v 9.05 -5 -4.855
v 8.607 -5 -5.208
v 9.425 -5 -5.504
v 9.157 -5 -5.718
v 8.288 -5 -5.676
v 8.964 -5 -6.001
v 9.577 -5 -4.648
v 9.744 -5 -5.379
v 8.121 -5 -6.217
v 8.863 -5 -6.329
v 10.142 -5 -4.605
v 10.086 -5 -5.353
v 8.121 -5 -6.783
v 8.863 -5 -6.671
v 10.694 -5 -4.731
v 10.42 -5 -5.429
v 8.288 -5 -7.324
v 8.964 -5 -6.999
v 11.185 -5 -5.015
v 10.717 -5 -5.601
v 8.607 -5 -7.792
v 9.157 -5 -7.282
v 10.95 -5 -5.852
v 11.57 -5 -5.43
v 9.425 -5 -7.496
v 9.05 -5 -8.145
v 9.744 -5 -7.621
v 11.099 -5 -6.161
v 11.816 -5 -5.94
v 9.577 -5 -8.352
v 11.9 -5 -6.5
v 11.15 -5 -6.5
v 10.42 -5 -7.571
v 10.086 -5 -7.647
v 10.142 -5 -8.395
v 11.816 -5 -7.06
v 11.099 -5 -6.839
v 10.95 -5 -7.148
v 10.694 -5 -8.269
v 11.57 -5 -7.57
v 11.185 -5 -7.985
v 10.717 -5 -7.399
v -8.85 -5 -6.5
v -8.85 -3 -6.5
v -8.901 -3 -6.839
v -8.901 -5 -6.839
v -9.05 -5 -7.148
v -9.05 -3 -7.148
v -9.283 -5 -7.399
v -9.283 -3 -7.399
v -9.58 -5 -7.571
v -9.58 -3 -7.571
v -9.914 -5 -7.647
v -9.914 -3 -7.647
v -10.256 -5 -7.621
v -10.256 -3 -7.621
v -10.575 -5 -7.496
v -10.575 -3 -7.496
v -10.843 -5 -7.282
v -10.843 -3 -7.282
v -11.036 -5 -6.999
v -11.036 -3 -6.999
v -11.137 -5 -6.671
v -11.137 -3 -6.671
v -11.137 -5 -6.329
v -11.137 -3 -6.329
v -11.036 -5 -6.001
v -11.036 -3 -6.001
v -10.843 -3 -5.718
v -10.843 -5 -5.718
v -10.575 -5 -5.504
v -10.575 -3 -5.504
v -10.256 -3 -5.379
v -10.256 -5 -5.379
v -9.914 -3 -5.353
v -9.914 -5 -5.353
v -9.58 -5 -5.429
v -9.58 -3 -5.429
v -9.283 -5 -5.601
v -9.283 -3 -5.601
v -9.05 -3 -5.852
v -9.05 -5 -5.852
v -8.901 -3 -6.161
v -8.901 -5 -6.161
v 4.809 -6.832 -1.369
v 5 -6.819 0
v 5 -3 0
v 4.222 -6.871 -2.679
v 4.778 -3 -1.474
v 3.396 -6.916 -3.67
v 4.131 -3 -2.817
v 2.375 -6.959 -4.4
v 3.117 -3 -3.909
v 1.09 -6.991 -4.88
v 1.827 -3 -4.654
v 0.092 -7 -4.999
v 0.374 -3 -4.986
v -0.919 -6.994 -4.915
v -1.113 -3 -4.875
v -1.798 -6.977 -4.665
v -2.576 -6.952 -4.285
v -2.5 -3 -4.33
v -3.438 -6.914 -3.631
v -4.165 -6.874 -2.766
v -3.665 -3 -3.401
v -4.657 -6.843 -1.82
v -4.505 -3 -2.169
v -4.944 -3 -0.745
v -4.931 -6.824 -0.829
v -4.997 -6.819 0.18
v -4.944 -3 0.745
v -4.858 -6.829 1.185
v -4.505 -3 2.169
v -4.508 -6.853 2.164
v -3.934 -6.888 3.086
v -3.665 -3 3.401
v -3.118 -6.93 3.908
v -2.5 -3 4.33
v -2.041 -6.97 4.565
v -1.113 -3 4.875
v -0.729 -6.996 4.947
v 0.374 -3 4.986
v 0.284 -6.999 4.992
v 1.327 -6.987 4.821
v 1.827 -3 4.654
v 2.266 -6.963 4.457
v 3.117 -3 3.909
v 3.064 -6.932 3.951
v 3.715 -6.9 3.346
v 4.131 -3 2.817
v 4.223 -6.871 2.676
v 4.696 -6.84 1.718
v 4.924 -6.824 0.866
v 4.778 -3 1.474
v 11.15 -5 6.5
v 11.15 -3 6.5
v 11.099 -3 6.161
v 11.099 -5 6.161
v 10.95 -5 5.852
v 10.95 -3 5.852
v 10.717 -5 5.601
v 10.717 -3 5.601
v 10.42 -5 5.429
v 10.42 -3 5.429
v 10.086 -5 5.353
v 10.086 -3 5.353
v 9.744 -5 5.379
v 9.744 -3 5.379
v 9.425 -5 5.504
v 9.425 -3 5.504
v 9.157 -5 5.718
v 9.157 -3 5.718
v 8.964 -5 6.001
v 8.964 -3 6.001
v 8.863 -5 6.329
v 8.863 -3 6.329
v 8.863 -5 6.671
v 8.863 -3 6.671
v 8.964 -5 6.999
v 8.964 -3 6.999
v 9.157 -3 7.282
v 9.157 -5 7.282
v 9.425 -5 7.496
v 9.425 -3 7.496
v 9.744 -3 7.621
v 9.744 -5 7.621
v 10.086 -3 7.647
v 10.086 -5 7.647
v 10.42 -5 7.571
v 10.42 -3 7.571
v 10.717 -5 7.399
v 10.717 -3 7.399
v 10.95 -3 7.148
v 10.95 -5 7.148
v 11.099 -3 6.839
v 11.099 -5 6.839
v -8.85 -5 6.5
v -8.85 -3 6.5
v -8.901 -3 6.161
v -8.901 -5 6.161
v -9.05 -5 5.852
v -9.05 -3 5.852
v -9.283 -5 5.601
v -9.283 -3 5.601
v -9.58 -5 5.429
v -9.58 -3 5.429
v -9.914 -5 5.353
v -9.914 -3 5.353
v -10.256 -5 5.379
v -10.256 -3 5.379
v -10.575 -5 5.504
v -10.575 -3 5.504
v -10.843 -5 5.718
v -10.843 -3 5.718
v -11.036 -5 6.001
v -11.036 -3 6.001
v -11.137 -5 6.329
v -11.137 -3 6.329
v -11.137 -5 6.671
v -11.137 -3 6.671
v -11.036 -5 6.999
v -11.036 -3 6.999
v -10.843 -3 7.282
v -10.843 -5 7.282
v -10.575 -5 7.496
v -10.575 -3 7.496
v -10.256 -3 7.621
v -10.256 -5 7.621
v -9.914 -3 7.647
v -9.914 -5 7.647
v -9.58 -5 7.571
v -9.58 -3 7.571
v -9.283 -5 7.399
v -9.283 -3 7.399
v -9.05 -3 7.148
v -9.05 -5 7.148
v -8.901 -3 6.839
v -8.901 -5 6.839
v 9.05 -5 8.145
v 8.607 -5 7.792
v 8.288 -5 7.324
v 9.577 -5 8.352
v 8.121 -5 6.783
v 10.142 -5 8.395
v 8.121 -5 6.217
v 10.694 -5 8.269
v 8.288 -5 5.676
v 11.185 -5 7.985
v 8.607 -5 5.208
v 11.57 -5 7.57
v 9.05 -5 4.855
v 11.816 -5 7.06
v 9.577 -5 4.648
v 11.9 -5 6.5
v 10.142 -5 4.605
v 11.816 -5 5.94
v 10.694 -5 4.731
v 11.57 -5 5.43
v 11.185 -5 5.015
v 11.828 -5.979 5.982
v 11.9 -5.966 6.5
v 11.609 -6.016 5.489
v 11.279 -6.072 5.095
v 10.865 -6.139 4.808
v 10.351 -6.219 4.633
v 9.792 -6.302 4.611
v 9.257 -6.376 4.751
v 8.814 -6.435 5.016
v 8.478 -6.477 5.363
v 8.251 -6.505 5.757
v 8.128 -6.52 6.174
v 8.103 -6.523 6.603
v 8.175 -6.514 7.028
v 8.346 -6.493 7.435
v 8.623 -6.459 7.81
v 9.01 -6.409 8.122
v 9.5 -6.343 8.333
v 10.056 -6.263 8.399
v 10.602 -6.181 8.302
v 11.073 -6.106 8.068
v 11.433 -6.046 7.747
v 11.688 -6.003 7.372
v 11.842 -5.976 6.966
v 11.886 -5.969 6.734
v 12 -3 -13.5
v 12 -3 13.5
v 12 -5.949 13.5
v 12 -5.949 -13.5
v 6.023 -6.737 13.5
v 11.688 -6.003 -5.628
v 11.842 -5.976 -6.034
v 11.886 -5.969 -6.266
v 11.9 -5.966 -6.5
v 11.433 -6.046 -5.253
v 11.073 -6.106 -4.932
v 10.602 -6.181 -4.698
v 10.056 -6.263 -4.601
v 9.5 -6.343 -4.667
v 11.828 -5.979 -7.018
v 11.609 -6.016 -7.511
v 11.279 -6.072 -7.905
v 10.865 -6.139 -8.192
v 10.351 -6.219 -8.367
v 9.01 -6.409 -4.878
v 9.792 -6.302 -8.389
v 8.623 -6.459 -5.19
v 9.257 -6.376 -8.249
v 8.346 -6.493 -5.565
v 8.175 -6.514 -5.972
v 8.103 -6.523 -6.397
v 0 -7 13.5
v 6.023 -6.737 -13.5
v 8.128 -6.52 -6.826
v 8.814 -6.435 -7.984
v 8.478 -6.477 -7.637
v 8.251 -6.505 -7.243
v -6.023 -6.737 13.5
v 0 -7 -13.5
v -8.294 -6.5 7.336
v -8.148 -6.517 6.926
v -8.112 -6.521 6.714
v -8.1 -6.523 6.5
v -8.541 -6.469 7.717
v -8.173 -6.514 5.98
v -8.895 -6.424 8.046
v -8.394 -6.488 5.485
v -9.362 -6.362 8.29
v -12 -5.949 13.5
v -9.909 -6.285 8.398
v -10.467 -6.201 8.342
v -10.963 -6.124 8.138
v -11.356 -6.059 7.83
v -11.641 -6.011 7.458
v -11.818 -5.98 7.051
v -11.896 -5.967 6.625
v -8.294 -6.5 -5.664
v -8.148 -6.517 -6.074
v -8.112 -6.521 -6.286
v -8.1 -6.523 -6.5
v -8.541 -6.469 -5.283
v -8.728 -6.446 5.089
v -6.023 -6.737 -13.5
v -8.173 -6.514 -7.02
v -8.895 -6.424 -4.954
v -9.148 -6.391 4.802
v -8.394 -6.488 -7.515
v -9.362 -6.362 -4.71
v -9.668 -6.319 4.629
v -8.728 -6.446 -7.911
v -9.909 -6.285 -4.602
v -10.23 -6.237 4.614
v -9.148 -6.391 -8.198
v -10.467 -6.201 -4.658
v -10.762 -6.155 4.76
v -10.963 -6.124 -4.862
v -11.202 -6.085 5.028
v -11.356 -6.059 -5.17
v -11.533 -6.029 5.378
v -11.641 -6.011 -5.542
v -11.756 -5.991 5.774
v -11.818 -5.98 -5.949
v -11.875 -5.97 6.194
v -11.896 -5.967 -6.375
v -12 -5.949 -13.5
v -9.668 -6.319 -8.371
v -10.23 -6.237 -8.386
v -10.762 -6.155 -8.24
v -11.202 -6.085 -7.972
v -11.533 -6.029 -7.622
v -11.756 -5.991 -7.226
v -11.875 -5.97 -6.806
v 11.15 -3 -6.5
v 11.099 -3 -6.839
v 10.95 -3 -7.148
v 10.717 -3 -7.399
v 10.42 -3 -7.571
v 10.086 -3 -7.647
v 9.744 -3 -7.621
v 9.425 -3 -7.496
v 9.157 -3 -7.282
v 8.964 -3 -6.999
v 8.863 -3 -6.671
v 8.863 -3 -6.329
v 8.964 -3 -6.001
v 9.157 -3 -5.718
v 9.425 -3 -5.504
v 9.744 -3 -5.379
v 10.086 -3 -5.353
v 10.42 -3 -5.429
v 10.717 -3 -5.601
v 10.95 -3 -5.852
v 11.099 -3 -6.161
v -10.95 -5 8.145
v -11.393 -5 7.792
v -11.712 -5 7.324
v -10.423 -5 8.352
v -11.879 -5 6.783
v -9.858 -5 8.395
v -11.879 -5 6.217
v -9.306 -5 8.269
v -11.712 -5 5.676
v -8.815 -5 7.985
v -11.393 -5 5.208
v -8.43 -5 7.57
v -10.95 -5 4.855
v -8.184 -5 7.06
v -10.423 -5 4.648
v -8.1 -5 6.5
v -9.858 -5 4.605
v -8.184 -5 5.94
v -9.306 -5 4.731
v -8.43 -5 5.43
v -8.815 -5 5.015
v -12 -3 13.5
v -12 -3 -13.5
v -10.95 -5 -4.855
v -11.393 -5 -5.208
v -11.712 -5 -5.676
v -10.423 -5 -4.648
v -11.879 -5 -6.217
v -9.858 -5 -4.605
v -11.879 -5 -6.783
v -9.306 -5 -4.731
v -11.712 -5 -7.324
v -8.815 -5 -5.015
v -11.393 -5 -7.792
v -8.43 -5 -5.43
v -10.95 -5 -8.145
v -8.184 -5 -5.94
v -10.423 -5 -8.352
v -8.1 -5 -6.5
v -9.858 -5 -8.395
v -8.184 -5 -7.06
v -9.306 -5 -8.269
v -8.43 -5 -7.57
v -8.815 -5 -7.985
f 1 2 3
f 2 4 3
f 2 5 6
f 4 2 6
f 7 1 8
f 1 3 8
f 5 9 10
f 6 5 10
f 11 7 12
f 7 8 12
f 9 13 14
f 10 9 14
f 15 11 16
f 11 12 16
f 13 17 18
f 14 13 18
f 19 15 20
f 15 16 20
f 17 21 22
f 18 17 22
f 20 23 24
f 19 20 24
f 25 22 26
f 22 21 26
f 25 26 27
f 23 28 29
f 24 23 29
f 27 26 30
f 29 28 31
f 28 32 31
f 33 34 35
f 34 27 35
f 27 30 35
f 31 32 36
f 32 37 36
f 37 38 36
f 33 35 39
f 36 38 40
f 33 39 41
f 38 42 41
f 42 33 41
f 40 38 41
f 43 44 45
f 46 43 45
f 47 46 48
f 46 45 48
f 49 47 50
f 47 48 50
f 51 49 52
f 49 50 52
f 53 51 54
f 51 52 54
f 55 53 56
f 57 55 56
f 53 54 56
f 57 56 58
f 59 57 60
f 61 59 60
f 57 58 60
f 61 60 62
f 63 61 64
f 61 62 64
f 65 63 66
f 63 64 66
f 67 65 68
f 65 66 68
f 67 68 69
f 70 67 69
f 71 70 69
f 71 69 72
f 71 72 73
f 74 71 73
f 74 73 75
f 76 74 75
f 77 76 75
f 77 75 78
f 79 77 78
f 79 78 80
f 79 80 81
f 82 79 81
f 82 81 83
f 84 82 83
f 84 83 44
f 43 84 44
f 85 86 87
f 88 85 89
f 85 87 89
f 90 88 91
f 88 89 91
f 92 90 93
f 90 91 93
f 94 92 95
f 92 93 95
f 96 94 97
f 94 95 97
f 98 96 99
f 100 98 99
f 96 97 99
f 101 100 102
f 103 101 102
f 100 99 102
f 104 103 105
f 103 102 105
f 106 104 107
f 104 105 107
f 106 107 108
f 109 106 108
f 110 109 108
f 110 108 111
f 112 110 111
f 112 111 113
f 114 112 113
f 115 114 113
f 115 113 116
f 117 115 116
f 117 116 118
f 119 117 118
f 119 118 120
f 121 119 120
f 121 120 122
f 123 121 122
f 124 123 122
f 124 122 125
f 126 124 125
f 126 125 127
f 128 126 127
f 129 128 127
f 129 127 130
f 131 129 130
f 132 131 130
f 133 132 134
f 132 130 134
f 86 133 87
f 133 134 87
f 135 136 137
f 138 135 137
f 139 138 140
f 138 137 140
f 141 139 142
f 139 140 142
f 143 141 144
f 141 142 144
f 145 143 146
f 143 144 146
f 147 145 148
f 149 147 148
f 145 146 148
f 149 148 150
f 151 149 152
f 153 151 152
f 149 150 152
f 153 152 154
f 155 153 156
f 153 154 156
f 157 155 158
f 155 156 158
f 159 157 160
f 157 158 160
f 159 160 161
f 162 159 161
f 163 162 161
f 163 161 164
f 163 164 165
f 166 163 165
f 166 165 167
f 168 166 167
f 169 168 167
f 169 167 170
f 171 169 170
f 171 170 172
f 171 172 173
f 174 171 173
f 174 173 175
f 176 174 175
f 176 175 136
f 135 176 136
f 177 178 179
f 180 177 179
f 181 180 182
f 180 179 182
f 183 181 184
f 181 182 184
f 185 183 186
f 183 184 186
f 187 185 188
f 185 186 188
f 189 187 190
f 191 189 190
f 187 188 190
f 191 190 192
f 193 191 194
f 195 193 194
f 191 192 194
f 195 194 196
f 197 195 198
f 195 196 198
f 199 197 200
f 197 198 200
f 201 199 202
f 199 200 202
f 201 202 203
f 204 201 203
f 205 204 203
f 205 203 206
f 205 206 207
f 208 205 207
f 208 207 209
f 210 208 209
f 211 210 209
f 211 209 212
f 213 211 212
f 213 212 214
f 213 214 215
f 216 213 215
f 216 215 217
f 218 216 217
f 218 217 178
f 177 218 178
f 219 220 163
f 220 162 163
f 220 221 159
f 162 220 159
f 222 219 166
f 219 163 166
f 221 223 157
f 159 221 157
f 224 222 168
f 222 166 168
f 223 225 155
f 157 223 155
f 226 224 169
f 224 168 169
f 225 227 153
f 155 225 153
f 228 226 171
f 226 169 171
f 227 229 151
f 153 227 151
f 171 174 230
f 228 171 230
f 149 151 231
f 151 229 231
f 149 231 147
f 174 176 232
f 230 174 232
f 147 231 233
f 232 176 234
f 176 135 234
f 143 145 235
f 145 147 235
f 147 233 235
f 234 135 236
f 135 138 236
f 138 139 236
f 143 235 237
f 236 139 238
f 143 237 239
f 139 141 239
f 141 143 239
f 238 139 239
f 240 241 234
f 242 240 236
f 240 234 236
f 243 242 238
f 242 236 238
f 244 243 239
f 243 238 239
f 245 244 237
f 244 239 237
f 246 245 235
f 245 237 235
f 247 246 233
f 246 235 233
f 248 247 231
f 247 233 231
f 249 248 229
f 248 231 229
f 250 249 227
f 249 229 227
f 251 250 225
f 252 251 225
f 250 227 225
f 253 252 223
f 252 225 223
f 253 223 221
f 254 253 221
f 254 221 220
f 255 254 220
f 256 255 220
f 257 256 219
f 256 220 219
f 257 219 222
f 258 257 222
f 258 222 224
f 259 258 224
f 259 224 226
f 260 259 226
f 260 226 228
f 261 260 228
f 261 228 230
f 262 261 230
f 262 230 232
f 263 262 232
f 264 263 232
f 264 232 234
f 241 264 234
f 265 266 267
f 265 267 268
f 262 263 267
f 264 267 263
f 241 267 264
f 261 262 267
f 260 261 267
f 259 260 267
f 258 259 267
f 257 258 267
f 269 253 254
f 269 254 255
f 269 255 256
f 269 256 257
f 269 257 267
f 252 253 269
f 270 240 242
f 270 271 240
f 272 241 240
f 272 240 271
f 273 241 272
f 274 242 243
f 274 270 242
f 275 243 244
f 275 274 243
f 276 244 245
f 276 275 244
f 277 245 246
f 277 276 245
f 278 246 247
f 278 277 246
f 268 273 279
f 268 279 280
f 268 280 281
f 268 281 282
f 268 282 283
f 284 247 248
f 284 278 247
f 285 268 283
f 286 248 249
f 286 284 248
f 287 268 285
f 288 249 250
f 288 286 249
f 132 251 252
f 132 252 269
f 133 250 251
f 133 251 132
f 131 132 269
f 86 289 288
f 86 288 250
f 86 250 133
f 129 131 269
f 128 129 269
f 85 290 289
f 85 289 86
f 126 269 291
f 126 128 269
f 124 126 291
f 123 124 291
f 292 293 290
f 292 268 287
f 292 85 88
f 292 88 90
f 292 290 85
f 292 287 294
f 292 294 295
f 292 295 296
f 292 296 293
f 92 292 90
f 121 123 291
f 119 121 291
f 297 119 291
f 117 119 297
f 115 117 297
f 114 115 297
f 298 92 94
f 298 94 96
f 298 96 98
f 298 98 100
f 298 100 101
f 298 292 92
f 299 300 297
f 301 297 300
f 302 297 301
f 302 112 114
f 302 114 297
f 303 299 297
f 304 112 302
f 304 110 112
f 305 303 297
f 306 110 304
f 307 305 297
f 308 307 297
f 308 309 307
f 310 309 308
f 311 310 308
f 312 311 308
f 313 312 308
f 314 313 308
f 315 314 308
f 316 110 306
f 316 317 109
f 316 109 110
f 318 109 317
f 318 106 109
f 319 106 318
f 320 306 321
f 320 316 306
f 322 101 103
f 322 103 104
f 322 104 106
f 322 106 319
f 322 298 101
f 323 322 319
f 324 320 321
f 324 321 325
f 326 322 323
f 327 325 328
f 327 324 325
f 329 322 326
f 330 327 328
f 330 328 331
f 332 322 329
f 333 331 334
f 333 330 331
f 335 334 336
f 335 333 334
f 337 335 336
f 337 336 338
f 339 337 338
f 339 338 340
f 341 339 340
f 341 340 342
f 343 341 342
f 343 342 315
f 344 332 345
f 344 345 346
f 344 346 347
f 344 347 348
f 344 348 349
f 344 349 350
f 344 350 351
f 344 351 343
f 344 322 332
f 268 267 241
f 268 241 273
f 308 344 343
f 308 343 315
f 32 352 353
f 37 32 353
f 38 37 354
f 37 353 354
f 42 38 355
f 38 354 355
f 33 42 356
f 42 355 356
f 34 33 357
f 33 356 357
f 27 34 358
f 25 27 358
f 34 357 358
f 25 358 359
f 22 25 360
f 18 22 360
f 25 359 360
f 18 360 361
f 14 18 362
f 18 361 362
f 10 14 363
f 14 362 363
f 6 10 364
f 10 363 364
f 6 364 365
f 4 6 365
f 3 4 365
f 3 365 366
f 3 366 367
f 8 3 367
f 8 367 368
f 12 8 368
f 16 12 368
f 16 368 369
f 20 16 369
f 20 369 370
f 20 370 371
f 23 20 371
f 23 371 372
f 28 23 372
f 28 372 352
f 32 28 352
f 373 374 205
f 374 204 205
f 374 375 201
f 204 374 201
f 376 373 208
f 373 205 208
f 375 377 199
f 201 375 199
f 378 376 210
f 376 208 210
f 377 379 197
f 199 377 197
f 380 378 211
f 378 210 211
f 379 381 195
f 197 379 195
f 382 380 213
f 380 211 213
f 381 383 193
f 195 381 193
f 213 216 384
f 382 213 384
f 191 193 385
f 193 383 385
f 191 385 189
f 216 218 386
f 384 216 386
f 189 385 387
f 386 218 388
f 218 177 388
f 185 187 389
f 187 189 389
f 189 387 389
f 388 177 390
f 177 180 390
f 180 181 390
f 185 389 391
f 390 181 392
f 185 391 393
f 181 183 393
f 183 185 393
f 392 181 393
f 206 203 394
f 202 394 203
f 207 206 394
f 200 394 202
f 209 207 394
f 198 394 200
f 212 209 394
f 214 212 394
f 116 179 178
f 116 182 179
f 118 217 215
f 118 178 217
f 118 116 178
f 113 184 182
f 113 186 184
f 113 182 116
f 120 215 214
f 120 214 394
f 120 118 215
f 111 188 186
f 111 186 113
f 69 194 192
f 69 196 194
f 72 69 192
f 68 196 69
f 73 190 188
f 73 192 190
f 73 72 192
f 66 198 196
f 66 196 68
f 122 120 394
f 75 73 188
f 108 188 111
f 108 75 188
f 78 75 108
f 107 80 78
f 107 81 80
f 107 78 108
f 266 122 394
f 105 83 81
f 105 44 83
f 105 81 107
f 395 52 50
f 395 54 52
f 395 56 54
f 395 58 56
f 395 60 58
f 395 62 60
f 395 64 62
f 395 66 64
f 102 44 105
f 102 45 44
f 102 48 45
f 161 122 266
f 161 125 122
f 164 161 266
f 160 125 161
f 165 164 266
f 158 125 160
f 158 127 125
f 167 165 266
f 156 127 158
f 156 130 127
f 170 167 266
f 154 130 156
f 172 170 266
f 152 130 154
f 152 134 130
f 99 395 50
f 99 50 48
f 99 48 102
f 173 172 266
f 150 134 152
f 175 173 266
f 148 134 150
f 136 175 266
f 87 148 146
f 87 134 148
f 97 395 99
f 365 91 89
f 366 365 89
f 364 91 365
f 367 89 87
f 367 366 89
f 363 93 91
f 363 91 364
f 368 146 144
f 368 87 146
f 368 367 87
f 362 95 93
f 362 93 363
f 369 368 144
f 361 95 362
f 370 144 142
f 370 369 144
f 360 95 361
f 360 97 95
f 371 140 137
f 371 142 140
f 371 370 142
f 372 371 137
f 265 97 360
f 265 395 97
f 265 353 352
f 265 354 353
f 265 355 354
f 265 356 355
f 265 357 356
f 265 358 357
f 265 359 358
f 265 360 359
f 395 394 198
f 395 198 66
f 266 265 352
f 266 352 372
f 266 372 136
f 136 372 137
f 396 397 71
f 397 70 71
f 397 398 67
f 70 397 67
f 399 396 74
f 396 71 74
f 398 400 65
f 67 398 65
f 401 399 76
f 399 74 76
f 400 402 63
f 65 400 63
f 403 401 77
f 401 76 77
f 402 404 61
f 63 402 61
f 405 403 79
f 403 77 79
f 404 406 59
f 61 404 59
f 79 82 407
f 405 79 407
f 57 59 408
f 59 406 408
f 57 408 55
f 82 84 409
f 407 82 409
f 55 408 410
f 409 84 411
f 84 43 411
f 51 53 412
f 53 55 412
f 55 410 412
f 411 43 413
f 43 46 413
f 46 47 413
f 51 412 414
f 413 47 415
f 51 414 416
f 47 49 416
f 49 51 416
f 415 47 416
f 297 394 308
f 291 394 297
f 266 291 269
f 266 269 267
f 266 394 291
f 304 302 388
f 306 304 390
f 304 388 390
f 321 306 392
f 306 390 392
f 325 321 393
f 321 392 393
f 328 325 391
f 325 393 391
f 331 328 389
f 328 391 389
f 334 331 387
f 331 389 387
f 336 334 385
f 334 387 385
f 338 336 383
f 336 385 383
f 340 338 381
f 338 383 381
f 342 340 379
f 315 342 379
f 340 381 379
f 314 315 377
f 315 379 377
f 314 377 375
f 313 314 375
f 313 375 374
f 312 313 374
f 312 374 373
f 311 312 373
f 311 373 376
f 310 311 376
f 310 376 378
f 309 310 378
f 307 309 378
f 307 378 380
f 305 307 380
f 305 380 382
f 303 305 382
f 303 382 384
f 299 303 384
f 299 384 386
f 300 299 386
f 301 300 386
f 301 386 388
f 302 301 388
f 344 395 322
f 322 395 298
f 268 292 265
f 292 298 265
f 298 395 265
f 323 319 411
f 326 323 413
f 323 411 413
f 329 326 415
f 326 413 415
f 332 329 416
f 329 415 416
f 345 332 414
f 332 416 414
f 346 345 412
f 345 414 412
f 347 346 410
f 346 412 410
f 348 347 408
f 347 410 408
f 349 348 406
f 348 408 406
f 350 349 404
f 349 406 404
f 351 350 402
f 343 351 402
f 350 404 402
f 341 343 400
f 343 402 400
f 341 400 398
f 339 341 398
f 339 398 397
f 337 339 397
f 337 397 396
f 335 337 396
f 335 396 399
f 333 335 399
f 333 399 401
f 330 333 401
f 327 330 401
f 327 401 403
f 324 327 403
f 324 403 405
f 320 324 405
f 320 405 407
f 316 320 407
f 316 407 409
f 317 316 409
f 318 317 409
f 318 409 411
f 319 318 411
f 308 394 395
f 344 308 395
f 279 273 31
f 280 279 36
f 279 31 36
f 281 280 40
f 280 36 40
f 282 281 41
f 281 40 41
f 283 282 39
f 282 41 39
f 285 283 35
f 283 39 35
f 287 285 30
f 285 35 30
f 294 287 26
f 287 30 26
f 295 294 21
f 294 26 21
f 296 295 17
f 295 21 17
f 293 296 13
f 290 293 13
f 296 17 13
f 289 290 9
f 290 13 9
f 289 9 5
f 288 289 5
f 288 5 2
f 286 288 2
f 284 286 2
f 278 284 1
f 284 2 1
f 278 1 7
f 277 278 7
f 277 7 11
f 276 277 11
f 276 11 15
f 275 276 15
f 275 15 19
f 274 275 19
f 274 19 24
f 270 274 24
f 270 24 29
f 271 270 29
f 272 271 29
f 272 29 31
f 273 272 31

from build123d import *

# Parameters (mm, degrees)
SKETCH4_W                = 24
SKETCH4_H                = 27
BOSS_EXTRUDE3_DEPTH      = 3
BOSS_EXTRUDE3_DEPTH_BACK = 8
SKETCH5_W                = 28.405044576
SKETCH5_H                = 3.736732925
SKETCH6_R                = 5
CUT_EXTRUDE1_DEPTH       = 4
CUT_EXTRUDE1_DEPTH_BACK  = 8
SKETCH7_W                = 24
SKETCH7_H                = 27
CUT_EXTRUDE2_DEPTH       = 6
SKETCH8_R                = 1.15
CUT_EXTRUDE3_DEPTH       = 5.0000001
CUT_EXTRUDE4_START       = -2
SKETCH9_R                = 1.9
CUT_EXTRUDE4_DEPTH       = 2


with BuildPart() as part:
    # Sketch4 → Boss-Extrude3 (new body, two sides)
    with BuildSketch(Plane(origin=(0, 0, 0), x_dir=(1, 0, 0), z_dir=(0, 1, 0))) as boss_extrude3_sk:
        Rectangle(SKETCH4_W, SKETCH4_H)
    extrude(amount=BOSS_EXTRUDE3_DEPTH)
    extrude(boss_extrude3_sk.sketch, amount=-BOSS_EXTRUDE3_DEPTH_BACK)

    # Sketch5 → Cut-Revolve1 (revolve, cut)
    with BuildSketch(Plane(origin=(0, 0, 0), x_dir=(0, 0, -1), z_dir=(1, 0, 0))):
        with Locations((0.702522288, -8.868366462)):
            Rectangle(SKETCH5_W, SKETCH5_H)
    revolve(axis=Axis((0, 62, 13.5), (0, 0, -1)), mode=Mode.SUBTRACT)

    # Sketch6 → Cut-Extrude1 (cut, two sides)
    with BuildSketch(Plane(origin=(0, 0, 0), x_dir=(1, 0, 0), z_dir=(0, 1, 0))) as cut_extrude1_sk:
        Circle(SKETCH6_R)
    extrude(amount=CUT_EXTRUDE1_DEPTH, mode=Mode.SUBTRACT)
    extrude(cut_extrude1_sk.sketch, amount=-CUT_EXTRUDE1_DEPTH_BACK, mode=Mode.SUBTRACT)

    # Sketch7 → Cut-Extrude2 (cut)
    with BuildSketch(Plane(origin=(0, 3, 0), x_dir=(1, 0, 0), z_dir=(0, 1, 0))):
        Rectangle(SKETCH7_W, SKETCH7_H)
    extrude(amount=-CUT_EXTRUDE2_DEPTH, mode=Mode.SUBTRACT)

    # Sketch8 → Cut-Extrude3 (cut, through all)
    with BuildSketch(Plane(origin=(0, -3, 0), x_dir=(1, 0, 0), z_dir=(0, 1, 0))):
        with Locations((-10, 6.5)):
            Circle(SKETCH8_R)
        with Locations((-10, -6.5)):
            Circle(SKETCH8_R)
        with Locations((10, -6.5)):
            Circle(SKETCH8_R)
        with Locations((10, 6.5)):
            Circle(SKETCH8_R)
    extrude(amount=-CUT_EXTRUDE3_DEPTH, mode=Mode.SUBTRACT)

    # Sketch9 → Cut-Extrude4 (cut)
    with BuildSketch(Plane(origin=(0, -3, 0), x_dir=(1, 0, 0), z_dir=(0, 1, 0)).offset(CUT_EXTRUDE4_START)):
        with Locations((-10, 6.5)):
            Circle(SKETCH9_R)
        with Locations((-10, -6.5)):
            Circle(SKETCH9_R)
        with Locations((10, -6.5)):
            Circle(SKETCH9_R)
        with Locations((10, 6.5)):
            Circle(SKETCH9_R)
    extrude(amount=-CUT_EXTRUDE4_DEPTH, mode=Mode.SUBTRACT)


solid = part.part
